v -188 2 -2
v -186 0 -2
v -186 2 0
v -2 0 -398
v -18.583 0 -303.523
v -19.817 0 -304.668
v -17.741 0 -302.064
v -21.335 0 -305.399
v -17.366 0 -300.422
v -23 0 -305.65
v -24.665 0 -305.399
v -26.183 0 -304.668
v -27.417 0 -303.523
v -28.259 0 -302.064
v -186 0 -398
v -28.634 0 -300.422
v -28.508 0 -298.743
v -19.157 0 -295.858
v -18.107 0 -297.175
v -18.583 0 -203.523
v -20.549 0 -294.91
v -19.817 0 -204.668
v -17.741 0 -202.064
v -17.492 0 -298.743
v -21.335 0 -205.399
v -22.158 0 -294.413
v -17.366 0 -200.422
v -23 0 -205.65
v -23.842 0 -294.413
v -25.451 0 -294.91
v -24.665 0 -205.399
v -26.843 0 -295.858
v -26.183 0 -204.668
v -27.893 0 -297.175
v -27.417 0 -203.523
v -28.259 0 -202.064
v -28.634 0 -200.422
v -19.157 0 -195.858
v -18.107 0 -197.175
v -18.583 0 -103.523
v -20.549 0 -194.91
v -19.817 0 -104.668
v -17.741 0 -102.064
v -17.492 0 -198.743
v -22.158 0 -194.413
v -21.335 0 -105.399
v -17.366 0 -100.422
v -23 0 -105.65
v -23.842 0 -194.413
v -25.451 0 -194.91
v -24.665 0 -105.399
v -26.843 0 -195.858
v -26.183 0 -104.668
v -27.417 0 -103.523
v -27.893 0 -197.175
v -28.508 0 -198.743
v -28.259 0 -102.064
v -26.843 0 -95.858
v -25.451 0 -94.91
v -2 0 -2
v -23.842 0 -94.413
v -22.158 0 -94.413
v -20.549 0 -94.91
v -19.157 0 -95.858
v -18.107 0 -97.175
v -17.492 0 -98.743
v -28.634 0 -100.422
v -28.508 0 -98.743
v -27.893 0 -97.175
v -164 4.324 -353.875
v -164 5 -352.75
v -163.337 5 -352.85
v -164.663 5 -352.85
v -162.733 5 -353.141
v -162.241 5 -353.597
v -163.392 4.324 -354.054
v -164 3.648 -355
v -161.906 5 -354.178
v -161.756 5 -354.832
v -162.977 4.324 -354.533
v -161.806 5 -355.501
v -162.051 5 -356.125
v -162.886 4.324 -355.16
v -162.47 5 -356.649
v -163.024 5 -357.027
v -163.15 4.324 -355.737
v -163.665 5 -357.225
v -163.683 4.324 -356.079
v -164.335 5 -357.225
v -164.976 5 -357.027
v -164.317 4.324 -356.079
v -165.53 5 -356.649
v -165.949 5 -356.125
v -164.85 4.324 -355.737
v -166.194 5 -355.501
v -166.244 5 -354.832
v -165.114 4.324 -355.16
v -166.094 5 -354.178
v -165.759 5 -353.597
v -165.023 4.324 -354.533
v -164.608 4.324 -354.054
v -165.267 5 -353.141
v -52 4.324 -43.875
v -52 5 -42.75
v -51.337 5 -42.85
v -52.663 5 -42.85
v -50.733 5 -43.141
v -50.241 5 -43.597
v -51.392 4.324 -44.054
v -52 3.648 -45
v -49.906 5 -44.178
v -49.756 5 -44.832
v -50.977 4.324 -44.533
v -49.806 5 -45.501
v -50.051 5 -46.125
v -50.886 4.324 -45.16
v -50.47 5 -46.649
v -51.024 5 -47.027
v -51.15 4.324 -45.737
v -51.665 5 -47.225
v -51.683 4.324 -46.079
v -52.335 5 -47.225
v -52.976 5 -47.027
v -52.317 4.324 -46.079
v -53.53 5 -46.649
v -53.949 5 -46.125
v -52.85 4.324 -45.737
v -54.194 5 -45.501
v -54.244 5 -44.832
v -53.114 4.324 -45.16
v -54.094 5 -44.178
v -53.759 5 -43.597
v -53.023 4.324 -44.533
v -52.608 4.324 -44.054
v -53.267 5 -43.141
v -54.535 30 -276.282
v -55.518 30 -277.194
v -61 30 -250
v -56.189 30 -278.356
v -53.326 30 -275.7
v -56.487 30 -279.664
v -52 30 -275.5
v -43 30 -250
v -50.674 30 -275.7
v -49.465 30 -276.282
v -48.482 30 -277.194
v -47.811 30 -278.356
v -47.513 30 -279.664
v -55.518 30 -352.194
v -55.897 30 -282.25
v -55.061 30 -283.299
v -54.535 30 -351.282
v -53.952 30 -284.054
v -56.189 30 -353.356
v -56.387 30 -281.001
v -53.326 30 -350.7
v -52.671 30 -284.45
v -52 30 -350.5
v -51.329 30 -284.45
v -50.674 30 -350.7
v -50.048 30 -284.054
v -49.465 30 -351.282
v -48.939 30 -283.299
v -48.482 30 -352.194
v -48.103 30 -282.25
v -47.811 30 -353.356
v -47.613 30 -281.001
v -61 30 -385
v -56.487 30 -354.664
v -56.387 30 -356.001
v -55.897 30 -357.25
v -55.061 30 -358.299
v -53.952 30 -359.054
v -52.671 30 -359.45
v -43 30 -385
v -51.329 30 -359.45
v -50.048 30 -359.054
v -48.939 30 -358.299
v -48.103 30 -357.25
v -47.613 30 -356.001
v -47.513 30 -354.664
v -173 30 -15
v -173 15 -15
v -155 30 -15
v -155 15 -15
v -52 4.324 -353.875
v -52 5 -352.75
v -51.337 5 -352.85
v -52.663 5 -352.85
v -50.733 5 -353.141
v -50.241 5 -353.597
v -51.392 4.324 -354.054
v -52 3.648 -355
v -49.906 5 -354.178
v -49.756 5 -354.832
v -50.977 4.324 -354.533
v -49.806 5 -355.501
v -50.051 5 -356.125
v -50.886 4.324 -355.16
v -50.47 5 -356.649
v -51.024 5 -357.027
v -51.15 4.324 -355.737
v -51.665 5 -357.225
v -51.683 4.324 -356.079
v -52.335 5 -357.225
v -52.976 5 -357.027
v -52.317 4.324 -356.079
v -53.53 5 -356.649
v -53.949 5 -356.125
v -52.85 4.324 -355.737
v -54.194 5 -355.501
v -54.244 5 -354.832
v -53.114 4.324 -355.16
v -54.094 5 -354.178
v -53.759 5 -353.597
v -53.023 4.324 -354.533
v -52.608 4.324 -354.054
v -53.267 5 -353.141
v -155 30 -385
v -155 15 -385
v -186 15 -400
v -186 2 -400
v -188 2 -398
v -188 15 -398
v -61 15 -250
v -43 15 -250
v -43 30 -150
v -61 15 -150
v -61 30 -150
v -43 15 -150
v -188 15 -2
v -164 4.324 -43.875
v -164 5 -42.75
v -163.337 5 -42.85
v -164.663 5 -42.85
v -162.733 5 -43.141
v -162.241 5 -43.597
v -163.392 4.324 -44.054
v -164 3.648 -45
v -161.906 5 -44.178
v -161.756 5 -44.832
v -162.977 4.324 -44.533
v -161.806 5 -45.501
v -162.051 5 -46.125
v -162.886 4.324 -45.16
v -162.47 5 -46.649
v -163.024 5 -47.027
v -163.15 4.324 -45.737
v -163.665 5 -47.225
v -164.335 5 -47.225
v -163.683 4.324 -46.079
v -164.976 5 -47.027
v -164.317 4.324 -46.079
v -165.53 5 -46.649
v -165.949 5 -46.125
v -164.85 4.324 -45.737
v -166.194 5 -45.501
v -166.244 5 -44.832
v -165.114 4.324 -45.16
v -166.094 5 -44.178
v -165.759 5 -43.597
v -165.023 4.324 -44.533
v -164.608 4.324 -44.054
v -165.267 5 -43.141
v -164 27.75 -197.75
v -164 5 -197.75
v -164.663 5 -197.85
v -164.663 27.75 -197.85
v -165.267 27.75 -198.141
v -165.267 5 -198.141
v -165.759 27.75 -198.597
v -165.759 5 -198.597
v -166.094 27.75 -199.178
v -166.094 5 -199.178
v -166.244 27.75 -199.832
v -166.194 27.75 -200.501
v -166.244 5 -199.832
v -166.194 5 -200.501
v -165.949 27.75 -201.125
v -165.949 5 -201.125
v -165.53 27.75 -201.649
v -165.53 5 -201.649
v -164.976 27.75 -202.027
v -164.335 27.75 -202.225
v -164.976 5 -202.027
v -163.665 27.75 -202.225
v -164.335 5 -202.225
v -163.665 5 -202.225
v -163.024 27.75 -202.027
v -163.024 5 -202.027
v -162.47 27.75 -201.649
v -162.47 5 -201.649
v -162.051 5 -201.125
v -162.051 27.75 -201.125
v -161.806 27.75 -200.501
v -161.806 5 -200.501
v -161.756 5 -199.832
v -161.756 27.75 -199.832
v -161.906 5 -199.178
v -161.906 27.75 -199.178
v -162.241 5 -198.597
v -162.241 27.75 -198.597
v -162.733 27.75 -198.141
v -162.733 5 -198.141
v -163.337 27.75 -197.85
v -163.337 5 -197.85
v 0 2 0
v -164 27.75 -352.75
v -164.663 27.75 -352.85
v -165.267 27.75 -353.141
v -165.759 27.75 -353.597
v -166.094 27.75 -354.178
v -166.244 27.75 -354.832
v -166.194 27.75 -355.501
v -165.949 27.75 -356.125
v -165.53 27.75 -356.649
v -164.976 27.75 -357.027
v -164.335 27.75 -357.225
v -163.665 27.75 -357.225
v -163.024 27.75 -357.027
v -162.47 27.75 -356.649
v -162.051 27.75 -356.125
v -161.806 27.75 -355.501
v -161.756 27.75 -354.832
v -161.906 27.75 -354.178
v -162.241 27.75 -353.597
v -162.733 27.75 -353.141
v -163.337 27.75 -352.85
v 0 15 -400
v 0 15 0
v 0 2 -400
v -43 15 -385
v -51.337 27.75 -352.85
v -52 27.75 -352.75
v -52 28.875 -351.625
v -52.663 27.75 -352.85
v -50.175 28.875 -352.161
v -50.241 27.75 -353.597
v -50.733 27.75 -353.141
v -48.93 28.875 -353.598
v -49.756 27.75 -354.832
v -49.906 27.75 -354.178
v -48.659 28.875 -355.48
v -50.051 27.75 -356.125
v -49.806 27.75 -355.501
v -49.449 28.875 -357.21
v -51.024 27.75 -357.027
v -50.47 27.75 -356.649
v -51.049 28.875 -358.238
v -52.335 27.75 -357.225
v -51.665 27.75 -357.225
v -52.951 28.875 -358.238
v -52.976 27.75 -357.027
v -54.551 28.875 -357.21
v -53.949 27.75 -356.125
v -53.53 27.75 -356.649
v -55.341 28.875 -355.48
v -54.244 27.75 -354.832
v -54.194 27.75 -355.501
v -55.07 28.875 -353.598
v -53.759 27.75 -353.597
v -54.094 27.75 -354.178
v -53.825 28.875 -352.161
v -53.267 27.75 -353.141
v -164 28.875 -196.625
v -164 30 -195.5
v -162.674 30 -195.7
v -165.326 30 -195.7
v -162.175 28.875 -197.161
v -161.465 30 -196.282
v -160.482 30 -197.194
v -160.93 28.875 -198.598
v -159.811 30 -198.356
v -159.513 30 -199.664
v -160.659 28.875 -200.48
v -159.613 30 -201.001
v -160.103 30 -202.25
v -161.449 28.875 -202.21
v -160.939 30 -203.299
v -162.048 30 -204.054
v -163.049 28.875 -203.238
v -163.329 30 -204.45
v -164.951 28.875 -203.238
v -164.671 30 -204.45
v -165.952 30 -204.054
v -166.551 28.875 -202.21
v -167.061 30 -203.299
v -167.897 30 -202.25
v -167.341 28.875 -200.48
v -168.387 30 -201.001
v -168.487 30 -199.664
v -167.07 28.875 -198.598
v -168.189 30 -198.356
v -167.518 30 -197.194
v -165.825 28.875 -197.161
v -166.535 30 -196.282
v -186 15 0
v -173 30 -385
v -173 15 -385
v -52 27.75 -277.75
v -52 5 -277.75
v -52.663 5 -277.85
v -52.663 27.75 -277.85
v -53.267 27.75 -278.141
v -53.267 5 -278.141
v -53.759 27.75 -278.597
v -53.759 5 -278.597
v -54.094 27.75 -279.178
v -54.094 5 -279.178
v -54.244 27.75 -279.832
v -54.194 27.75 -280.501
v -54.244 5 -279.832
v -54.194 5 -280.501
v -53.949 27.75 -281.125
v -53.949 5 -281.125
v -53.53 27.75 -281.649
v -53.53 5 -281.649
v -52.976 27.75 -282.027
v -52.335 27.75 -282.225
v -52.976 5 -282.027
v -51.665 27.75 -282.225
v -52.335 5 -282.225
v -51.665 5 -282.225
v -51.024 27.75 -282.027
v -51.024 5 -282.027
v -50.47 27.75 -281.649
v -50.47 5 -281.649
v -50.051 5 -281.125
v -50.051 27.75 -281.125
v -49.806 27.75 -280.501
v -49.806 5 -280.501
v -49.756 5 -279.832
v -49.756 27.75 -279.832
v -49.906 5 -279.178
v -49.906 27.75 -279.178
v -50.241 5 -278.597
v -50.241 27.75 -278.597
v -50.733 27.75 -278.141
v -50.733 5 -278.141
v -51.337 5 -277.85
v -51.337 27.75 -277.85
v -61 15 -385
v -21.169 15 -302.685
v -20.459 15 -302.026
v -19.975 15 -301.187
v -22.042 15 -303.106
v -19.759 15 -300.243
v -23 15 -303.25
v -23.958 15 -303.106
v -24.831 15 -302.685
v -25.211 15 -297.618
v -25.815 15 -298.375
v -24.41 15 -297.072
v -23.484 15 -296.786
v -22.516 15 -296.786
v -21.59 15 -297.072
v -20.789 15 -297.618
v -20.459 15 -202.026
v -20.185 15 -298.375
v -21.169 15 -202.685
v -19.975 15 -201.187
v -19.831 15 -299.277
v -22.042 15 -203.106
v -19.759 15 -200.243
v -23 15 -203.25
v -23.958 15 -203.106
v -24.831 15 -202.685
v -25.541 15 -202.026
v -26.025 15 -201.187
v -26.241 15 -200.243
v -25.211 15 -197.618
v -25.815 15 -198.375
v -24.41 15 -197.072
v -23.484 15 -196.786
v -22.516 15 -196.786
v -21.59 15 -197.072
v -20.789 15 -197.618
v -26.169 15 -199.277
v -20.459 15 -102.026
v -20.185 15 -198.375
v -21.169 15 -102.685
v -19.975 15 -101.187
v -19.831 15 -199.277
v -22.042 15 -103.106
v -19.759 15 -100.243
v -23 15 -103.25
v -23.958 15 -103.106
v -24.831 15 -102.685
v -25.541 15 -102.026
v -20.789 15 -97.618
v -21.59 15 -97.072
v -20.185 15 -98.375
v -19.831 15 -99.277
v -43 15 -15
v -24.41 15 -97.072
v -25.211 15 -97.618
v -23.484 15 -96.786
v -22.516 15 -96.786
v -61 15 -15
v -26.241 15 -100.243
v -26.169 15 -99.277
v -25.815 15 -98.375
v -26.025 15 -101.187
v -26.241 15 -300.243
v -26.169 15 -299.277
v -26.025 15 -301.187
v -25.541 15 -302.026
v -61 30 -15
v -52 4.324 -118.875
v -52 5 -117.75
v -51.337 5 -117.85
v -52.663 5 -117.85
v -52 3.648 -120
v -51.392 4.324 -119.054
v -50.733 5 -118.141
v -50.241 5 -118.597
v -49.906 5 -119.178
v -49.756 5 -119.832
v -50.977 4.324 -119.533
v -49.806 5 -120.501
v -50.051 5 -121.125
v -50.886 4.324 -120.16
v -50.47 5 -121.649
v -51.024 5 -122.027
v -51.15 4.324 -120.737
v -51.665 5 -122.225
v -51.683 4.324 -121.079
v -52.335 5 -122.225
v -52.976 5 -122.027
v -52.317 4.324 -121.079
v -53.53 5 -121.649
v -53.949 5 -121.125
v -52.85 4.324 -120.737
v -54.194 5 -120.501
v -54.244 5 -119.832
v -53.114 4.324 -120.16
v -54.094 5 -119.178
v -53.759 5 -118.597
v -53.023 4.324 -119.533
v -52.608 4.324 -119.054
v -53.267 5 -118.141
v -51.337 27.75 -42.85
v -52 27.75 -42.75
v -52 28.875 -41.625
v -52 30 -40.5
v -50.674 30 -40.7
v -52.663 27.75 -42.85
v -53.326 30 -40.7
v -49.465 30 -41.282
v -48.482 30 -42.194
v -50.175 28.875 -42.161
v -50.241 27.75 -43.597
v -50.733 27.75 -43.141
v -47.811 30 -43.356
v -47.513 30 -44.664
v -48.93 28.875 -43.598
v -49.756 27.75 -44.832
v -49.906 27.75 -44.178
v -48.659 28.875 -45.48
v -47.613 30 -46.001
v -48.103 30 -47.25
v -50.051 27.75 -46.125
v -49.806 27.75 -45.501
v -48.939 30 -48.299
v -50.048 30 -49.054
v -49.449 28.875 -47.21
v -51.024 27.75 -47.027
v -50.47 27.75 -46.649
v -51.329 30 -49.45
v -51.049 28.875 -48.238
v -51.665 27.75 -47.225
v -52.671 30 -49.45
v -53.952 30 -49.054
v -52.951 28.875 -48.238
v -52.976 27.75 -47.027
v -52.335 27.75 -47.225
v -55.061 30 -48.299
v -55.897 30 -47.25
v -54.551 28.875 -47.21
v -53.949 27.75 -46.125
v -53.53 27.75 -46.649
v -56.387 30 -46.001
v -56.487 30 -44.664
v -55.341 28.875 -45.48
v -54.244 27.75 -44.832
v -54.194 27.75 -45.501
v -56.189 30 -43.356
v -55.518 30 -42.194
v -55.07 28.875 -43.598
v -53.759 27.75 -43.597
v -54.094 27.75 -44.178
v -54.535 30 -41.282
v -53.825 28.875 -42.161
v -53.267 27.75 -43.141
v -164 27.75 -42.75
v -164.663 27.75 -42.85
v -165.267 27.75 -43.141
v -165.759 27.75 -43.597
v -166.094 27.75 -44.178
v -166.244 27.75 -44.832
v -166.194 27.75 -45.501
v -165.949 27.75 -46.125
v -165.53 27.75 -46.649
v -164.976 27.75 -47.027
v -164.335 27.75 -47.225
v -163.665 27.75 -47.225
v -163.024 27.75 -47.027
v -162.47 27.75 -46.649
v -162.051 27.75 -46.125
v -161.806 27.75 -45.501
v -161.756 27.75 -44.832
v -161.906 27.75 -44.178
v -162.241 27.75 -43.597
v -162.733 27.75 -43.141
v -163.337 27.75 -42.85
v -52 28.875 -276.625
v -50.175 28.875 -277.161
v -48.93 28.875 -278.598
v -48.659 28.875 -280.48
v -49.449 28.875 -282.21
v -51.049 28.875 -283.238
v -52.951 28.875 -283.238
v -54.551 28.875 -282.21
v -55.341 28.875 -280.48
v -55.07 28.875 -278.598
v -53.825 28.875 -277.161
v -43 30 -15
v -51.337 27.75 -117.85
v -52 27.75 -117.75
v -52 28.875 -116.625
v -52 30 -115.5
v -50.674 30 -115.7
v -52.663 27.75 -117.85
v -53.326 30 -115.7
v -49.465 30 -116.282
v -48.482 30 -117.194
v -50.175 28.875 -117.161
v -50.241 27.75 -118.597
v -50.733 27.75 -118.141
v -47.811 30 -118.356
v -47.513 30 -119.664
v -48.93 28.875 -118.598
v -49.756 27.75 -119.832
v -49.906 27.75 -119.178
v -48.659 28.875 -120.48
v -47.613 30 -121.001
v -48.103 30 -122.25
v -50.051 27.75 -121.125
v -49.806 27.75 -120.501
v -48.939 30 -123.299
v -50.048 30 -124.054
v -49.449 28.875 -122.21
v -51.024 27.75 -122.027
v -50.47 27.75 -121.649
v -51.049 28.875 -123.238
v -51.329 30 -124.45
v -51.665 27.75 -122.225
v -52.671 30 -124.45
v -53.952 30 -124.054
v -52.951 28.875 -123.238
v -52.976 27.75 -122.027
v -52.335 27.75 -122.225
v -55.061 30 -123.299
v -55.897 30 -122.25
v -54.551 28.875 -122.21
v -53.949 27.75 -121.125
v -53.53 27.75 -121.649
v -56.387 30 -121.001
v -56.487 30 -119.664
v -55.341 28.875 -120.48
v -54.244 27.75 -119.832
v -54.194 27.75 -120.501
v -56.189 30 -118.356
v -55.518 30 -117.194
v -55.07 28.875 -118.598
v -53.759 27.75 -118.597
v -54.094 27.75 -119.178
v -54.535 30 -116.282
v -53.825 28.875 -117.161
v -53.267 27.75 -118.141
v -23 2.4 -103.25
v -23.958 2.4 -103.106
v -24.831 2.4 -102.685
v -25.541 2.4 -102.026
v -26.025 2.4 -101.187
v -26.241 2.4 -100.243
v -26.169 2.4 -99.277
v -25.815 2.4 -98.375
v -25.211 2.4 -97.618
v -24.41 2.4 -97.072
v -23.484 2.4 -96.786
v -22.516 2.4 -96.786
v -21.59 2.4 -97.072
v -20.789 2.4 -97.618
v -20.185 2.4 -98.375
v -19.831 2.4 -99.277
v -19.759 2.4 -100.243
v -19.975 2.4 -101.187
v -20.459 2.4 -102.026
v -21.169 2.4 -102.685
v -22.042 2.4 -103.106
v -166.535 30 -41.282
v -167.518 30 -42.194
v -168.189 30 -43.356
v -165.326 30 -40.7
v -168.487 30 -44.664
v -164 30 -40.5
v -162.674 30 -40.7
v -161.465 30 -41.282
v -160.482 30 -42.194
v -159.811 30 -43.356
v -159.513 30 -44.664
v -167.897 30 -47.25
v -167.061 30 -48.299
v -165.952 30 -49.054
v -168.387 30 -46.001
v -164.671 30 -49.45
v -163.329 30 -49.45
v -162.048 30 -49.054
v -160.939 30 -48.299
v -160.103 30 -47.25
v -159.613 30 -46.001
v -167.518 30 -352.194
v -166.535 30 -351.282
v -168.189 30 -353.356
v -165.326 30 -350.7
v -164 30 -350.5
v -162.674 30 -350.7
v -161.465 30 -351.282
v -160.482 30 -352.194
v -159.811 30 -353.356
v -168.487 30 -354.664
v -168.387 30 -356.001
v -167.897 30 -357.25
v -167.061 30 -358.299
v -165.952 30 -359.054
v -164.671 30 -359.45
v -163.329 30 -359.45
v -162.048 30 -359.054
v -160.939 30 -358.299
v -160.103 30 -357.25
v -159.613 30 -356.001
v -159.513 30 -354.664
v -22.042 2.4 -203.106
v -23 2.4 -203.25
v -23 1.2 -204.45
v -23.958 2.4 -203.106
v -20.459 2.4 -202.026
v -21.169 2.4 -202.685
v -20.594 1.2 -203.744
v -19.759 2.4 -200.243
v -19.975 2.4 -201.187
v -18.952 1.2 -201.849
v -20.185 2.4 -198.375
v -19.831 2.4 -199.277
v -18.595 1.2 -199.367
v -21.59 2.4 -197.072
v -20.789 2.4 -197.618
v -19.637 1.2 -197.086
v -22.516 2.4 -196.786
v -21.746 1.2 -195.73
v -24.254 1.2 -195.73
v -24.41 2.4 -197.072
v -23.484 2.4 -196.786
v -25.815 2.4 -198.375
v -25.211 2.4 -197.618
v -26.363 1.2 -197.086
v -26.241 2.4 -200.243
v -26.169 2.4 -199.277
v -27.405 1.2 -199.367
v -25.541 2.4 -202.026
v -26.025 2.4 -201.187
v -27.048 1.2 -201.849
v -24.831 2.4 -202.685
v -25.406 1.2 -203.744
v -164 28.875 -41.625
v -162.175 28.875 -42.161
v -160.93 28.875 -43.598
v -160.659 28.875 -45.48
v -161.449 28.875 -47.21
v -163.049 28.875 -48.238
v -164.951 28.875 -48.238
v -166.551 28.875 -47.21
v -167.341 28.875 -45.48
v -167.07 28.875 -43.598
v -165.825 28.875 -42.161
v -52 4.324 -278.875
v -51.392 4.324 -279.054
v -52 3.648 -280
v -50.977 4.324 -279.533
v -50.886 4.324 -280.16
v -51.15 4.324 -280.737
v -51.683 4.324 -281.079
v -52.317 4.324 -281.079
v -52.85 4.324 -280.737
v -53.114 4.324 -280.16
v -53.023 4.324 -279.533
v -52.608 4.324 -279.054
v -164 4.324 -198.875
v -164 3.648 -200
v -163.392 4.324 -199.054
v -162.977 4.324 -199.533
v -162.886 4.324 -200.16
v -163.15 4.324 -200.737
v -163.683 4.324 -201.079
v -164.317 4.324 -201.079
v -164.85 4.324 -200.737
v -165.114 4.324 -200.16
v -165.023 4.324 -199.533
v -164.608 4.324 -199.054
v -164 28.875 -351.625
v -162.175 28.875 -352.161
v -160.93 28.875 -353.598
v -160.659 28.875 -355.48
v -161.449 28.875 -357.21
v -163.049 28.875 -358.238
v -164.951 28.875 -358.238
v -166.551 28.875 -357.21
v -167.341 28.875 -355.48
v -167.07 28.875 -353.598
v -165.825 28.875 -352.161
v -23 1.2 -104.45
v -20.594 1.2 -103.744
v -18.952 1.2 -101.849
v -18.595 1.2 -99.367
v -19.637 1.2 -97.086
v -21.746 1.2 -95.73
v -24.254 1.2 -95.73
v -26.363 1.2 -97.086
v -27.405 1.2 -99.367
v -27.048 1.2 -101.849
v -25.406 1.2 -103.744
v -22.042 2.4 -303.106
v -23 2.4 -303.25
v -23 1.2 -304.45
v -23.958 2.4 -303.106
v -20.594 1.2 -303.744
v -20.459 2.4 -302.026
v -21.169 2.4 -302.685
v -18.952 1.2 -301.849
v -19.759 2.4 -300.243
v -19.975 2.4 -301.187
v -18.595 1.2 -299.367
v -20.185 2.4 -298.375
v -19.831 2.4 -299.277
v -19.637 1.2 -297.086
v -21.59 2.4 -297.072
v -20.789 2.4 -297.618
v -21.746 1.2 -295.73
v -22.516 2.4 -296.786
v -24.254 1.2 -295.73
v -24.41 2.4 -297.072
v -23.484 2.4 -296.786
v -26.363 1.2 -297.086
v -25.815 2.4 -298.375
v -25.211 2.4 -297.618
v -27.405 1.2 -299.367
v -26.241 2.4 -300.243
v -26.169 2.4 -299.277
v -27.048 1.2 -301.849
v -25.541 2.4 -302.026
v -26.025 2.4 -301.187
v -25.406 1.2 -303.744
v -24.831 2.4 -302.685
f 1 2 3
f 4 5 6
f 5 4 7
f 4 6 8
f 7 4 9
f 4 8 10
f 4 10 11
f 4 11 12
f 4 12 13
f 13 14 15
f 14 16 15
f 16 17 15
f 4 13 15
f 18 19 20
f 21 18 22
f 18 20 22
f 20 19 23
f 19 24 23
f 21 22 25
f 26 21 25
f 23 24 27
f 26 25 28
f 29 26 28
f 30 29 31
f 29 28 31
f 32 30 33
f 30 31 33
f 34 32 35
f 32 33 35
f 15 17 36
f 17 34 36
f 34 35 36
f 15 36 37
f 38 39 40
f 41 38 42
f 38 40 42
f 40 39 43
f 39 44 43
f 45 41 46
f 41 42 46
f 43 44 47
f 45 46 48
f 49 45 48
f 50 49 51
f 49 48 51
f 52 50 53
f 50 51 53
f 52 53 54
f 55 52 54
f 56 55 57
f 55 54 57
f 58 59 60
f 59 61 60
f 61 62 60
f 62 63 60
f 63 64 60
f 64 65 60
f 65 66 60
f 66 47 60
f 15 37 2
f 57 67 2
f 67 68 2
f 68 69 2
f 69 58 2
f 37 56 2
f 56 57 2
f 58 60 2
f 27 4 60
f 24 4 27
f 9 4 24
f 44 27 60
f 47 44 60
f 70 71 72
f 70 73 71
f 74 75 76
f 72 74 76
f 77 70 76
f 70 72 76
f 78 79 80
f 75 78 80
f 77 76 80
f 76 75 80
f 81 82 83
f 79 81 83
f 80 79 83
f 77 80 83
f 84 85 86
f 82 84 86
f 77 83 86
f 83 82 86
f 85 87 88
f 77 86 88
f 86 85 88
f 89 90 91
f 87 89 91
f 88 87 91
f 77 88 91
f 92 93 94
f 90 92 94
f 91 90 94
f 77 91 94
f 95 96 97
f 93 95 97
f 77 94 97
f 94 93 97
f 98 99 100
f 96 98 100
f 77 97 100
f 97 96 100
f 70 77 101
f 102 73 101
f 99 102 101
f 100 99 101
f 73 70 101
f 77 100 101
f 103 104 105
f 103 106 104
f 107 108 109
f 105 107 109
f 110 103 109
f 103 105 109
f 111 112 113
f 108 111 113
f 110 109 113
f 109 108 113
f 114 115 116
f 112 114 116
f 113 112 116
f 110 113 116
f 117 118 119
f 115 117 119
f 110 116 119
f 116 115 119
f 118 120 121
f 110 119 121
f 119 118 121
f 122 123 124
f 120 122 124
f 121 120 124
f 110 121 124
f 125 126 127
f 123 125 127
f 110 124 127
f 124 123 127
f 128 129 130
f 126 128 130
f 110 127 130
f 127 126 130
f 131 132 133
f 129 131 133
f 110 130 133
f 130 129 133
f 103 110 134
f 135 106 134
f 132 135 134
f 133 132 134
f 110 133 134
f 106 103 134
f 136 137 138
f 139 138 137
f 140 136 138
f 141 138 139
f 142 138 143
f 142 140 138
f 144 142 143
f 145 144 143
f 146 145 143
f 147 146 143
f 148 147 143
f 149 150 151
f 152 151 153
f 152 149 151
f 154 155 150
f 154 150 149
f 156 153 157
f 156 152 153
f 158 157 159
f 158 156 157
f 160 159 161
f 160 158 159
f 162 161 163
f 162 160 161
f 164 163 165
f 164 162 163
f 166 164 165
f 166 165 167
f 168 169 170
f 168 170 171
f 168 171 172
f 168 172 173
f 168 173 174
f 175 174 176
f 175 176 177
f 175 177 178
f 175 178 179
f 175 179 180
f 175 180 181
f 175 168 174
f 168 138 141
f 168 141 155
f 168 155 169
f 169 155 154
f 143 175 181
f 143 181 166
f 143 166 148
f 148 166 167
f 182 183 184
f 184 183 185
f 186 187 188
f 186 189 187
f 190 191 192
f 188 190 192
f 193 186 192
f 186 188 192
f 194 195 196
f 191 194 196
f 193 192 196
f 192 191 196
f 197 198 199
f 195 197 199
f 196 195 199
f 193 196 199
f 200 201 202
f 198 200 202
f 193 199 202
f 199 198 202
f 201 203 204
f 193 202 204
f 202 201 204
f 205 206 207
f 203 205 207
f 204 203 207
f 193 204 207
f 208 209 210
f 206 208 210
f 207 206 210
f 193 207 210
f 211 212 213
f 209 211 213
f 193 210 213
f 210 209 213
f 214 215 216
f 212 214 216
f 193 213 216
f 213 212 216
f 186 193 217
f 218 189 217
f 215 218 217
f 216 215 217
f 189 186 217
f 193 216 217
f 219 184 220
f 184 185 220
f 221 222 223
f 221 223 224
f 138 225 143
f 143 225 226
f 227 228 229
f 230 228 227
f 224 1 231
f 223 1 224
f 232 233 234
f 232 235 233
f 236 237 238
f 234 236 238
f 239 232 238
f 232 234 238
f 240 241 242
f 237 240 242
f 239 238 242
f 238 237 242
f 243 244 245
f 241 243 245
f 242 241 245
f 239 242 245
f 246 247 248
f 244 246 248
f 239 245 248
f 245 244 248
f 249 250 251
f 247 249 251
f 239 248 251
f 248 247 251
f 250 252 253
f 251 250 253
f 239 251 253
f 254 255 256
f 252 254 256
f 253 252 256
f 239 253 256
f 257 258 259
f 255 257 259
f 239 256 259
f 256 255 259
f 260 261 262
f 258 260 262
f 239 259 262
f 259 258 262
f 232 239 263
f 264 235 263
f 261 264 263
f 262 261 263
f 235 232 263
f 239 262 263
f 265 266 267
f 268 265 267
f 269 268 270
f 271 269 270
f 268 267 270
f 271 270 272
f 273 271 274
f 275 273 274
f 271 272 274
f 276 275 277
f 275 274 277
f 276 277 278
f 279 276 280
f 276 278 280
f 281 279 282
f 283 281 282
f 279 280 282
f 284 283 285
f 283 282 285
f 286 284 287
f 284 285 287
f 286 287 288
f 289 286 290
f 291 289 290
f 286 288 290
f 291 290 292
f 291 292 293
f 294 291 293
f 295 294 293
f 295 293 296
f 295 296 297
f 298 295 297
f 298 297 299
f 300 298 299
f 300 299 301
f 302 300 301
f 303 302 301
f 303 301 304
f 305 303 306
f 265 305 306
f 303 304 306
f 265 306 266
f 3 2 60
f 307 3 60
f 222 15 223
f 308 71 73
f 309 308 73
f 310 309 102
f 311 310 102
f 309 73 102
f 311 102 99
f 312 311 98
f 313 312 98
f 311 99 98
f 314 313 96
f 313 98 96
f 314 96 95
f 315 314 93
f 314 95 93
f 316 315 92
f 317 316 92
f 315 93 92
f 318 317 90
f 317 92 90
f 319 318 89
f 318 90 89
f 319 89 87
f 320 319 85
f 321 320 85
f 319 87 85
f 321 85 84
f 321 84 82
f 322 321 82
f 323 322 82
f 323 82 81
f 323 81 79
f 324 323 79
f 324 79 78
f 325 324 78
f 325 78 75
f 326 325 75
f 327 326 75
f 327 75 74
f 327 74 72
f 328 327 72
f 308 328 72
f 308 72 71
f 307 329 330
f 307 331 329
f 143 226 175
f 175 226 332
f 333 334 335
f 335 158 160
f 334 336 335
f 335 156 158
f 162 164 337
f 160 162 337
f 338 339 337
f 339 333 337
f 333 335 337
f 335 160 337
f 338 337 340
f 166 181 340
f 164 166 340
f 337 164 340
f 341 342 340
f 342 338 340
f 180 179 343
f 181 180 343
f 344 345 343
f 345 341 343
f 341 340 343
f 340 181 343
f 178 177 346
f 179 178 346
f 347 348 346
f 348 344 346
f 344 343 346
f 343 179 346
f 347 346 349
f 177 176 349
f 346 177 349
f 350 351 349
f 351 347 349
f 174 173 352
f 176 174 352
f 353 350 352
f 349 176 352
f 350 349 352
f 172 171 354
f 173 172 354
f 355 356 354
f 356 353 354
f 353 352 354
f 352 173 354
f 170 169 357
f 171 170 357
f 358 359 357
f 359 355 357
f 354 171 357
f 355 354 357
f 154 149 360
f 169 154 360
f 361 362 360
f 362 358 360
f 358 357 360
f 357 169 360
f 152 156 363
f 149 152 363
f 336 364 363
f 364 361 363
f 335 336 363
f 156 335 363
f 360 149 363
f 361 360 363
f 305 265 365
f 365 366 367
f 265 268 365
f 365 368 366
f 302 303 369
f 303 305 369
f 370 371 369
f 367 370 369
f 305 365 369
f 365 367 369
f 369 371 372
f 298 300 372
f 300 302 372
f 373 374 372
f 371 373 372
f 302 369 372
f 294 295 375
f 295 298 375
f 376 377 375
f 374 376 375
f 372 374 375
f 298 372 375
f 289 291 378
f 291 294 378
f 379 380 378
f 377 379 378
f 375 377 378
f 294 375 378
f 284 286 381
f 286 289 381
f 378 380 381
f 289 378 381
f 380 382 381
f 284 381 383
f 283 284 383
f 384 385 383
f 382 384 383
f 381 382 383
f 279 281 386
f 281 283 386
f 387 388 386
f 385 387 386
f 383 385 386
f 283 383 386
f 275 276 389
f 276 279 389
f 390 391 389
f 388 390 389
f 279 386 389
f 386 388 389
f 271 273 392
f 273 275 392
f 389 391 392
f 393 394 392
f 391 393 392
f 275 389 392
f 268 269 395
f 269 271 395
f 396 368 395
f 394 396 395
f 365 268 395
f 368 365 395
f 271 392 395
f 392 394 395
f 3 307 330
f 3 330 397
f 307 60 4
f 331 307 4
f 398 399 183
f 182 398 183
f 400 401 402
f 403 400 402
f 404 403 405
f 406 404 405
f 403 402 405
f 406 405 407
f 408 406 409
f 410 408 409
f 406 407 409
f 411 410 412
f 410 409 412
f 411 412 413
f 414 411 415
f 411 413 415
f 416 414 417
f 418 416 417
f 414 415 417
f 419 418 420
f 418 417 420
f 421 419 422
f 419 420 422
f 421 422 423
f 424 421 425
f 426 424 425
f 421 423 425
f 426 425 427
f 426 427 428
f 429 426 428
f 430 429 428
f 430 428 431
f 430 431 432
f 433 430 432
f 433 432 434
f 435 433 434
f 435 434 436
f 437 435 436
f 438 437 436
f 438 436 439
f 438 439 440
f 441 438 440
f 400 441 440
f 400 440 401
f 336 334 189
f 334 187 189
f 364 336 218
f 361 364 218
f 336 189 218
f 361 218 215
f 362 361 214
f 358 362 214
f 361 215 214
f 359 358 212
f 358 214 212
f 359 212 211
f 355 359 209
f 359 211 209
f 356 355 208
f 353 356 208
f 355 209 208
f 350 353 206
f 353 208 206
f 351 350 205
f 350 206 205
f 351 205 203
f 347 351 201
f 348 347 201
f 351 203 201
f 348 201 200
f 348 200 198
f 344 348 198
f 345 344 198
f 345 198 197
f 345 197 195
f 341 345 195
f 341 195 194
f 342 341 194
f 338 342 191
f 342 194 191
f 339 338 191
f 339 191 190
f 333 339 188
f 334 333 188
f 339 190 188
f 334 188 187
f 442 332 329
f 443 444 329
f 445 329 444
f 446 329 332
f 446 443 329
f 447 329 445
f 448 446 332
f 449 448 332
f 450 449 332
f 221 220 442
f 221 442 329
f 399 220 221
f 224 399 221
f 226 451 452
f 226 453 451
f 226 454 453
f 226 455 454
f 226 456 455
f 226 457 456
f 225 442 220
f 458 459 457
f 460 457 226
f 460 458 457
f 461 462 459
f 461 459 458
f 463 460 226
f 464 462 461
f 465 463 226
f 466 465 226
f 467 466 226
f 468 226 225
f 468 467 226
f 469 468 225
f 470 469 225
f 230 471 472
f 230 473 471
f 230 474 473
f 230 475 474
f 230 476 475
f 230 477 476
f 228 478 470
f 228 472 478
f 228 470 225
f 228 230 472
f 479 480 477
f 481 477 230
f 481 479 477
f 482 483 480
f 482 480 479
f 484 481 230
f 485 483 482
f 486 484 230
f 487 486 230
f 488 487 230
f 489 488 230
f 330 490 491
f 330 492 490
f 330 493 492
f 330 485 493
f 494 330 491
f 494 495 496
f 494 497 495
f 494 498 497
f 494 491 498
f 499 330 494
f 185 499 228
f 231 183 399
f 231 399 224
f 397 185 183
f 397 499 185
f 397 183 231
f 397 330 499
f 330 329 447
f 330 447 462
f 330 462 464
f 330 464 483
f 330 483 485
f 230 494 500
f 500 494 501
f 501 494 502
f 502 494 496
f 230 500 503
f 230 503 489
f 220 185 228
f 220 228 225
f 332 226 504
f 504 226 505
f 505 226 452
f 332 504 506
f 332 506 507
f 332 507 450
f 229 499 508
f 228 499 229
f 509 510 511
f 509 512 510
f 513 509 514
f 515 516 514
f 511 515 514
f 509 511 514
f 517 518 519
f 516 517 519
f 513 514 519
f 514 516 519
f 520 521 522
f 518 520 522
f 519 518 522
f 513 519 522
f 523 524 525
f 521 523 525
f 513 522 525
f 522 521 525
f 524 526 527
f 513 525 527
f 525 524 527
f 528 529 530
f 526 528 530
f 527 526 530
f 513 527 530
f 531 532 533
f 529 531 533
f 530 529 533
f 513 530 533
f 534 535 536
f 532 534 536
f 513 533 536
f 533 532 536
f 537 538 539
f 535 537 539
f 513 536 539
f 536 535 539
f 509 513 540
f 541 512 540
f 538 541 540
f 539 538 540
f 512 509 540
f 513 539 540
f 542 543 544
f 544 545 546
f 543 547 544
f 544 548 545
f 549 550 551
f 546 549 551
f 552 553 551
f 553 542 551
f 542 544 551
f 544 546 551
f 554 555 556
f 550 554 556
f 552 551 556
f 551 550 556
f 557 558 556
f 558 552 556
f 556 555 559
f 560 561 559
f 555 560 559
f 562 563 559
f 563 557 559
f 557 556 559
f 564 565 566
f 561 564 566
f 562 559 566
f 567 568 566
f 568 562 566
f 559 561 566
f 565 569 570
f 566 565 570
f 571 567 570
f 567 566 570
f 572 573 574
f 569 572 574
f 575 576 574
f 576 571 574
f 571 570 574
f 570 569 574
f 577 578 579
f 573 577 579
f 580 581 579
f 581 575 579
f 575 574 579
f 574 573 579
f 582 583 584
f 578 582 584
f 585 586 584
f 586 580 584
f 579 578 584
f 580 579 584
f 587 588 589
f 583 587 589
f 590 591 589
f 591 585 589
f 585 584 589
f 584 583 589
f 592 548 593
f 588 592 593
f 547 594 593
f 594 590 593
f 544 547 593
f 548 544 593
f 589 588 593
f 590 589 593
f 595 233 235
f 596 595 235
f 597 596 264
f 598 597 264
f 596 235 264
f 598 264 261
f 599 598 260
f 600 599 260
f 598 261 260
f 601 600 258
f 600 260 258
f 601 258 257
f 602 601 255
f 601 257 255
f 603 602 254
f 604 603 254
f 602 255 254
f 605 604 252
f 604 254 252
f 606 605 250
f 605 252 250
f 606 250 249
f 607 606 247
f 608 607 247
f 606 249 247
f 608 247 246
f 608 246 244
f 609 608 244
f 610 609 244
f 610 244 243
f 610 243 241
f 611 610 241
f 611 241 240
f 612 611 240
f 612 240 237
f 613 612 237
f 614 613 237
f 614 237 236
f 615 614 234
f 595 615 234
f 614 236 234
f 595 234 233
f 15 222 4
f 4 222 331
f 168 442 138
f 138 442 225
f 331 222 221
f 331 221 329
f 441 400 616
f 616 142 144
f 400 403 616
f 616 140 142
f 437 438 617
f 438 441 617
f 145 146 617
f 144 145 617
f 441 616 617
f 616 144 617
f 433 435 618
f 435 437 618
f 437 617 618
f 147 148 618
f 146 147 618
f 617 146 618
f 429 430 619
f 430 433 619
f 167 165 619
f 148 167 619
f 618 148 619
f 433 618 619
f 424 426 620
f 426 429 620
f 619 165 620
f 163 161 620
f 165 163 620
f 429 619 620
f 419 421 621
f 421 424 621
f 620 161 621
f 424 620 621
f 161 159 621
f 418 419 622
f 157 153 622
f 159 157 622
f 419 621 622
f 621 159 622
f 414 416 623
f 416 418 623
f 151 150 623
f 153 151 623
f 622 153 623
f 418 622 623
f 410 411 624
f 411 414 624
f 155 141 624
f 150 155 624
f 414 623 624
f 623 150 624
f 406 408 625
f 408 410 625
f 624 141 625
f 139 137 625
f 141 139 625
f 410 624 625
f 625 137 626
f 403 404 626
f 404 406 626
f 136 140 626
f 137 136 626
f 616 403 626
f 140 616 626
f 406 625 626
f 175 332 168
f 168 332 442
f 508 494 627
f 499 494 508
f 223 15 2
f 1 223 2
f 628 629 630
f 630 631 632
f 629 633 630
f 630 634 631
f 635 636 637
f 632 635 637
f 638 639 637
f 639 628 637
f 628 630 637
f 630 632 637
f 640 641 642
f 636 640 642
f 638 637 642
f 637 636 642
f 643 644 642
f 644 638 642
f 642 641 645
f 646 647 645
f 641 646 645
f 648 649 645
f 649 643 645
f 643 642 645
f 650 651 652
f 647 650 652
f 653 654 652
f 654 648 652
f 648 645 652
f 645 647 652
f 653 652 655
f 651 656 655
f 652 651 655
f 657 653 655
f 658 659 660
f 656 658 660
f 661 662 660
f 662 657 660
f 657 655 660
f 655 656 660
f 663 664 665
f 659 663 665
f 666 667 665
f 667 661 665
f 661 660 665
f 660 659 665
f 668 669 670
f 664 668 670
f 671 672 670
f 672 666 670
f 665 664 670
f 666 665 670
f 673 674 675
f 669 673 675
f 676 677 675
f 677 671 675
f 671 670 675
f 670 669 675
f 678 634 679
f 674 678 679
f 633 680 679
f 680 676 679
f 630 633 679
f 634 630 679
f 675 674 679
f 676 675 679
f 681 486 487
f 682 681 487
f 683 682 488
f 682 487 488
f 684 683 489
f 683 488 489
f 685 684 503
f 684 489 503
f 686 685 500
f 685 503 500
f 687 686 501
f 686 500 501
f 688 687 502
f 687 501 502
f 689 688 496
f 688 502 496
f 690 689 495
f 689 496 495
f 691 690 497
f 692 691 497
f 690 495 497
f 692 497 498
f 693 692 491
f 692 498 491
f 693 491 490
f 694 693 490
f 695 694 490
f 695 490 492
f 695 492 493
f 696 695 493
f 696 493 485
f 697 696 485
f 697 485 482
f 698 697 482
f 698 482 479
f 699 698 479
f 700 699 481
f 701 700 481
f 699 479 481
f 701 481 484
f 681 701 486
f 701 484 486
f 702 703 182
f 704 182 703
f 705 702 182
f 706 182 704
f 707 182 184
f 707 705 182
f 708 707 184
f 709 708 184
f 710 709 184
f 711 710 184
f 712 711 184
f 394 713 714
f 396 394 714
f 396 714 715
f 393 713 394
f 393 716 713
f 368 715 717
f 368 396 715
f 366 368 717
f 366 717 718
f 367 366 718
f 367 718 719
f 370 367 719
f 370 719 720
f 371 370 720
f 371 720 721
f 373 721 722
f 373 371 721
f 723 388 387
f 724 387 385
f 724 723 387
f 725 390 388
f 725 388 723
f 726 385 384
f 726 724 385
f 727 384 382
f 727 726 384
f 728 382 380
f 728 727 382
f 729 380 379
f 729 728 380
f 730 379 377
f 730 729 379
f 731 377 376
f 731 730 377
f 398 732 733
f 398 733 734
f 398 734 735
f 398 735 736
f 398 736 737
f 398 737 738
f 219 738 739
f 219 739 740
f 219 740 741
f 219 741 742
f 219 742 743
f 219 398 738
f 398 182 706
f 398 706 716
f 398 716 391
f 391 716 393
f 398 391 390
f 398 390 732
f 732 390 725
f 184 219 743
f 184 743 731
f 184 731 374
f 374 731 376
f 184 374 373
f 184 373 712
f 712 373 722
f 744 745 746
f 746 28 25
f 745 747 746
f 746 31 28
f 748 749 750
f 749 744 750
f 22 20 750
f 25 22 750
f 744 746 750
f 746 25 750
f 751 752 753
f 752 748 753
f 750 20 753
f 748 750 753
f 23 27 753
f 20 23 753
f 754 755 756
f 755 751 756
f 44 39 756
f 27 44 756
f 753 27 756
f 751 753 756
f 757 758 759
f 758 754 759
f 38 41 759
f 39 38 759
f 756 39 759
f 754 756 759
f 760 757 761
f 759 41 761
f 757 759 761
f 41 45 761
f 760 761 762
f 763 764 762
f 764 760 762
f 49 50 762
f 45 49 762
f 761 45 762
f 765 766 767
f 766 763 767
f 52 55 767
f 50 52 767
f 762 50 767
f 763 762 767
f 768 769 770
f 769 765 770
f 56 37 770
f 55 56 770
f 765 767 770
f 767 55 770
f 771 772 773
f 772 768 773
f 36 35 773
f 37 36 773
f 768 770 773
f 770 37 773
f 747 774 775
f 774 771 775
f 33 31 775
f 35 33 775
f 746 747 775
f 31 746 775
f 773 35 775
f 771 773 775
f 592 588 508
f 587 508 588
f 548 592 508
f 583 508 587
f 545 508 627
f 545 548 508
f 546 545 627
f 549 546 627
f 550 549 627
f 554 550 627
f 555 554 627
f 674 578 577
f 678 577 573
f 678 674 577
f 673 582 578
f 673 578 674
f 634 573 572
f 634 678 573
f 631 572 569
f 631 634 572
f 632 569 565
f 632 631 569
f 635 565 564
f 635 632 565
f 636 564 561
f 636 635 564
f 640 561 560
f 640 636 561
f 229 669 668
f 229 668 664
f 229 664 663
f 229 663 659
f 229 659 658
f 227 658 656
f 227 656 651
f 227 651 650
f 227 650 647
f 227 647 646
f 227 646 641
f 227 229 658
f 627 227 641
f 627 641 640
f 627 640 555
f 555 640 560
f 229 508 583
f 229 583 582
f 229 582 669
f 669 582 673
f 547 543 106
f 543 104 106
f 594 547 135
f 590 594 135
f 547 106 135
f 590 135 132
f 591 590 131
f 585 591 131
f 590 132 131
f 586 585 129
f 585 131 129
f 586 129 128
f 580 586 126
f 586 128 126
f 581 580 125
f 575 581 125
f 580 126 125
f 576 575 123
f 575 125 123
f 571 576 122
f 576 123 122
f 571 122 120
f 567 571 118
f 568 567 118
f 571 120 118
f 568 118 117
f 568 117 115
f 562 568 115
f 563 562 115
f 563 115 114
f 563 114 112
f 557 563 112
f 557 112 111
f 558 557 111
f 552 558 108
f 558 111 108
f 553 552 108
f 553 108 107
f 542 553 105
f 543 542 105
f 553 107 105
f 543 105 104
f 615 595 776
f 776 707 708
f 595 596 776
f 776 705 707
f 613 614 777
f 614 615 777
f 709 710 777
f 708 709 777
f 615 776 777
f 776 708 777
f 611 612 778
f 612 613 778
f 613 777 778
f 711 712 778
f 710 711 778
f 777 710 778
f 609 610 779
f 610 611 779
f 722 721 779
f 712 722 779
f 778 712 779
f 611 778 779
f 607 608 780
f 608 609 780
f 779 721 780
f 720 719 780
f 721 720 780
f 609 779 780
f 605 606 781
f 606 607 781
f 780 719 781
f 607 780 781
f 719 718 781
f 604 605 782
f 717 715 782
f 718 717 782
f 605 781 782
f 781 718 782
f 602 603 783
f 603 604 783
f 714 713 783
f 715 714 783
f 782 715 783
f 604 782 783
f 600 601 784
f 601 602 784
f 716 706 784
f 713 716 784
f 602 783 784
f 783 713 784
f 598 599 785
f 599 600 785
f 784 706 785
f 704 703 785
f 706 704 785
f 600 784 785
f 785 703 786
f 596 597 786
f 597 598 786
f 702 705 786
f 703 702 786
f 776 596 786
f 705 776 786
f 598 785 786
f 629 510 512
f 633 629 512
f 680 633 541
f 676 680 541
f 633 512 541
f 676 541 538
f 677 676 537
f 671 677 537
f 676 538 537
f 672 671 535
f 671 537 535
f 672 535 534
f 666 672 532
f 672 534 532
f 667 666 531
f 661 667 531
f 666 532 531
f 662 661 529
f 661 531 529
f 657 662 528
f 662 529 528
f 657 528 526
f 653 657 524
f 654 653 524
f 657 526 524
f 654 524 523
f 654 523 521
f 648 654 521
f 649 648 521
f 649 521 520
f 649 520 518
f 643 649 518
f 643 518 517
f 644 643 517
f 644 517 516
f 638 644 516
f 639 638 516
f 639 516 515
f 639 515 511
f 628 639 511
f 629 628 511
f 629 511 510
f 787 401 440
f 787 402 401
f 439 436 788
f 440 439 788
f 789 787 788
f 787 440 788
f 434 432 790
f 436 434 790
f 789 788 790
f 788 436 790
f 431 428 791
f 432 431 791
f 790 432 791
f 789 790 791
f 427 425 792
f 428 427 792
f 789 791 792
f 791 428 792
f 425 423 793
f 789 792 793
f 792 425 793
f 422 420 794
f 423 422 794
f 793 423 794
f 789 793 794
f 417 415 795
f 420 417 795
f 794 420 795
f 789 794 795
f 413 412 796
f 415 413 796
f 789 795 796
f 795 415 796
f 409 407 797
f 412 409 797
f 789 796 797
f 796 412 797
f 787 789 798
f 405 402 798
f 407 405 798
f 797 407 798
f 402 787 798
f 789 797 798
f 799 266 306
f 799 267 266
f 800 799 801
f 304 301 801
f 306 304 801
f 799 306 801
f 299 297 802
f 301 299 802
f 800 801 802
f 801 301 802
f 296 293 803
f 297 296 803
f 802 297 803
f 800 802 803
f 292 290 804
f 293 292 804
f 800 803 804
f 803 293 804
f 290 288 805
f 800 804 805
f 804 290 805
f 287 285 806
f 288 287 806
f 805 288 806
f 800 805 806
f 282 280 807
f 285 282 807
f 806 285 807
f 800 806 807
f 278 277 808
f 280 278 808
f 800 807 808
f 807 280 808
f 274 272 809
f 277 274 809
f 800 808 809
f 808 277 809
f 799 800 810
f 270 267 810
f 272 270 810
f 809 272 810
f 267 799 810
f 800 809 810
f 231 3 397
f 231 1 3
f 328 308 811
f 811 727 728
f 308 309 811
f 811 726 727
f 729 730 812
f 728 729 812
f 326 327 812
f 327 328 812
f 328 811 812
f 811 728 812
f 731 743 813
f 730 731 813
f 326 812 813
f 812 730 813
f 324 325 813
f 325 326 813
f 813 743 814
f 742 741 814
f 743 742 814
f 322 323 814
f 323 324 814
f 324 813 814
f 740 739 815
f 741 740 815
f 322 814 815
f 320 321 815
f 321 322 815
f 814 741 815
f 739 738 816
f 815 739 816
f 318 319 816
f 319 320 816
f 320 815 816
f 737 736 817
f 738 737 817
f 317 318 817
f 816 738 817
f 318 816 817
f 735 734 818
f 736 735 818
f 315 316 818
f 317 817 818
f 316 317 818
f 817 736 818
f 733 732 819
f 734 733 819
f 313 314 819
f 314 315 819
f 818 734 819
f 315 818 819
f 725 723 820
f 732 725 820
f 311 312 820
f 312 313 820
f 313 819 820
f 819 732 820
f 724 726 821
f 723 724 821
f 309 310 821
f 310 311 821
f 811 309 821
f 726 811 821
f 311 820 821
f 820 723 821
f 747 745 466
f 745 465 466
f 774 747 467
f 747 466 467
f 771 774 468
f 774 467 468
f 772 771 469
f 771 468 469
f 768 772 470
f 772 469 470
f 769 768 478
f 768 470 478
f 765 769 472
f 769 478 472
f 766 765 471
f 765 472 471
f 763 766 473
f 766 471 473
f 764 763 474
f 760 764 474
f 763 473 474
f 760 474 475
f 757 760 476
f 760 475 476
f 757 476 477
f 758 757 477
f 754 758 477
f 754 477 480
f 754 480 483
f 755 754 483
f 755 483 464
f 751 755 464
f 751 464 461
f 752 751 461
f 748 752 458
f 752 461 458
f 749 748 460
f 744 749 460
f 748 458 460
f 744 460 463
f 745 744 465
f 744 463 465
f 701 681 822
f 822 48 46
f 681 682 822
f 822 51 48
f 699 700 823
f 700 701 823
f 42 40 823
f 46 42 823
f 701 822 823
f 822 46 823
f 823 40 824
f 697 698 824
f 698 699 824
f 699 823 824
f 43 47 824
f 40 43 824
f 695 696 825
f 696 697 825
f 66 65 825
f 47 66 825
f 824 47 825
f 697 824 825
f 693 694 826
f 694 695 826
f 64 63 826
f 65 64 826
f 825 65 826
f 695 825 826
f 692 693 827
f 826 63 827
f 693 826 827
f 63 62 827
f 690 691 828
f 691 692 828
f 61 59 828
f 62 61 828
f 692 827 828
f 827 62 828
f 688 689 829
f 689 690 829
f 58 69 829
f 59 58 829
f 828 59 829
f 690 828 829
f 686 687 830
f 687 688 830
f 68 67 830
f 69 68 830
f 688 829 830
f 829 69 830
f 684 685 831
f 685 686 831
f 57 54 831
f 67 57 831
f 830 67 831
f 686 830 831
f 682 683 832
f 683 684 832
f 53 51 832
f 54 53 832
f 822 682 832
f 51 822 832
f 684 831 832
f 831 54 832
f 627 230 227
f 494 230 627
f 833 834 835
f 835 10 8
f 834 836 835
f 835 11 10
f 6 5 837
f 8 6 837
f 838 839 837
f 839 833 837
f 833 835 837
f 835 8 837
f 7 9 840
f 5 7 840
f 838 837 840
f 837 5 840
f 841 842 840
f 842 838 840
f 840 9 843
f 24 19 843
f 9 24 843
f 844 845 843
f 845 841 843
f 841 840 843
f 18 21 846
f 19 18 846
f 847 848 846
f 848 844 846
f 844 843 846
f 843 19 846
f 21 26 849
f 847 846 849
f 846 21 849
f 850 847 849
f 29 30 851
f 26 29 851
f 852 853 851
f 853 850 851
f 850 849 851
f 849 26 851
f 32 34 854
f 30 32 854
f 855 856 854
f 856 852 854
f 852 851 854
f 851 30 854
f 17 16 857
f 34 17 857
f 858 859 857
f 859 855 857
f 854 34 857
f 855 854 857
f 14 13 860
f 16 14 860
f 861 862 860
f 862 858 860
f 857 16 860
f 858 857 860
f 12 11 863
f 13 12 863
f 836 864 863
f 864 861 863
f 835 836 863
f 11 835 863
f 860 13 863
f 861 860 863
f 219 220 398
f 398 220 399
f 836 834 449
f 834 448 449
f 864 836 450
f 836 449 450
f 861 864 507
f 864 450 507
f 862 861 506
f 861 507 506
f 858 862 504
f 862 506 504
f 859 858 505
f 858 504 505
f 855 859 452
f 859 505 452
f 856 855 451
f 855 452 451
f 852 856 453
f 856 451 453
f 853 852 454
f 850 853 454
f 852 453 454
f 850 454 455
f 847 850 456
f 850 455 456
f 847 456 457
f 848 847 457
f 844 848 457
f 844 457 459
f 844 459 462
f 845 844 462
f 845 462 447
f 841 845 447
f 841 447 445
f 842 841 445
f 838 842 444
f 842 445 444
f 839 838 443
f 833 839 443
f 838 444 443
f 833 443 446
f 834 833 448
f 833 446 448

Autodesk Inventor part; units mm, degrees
ref_plane "YZ Plane" through (0, 0, 0) normal (1, 0, 0) x (0, 1, 0)
ref_plane "XZ Plane" through (0, 0, 0) normal (0, 1, 0) x (-1, 0, 0)
ref_plane "XY Plane" through (0, 0, 0) normal (0, 0, 1) x (1, 0, 0)
sketch "Skizze1" plane through (0, 0, 0) normal (0, 1, 0) x (-1, 0, 0)
  line L0 (0, 0) -> (188, 0)
  line L1 (188, 0) -> (188, -400)
  line L2 (188, -400) -> (0, -400)
  line L3 (0, -400) -> (0, 0)
  dimension "d1" = 188
  dimension "d2" = 400
extrude "Extrusion1" add sketch "Skizze1" along normal blind 15
sketch "Skizze2" plane through (0, 15, 0) normal (0, 1, 0) x (1, 0, 0)
  line L0 (-173, 15) -> (-155, 15)
  line L1 (-155, 15) -> (-155, 385)
  line L2 (-155, 385) -> (-173, 385)
  line L3 (-173, 385) -> (-173, 15)
  line L4 (-43, 15) -> (-61, 15)
  line L5 (-61, 15) -> (-61, 150)
  line L6 (-61, 150) -> (-43, 150)
  line L7 (-43, 150) -> (-43, 15)
  line L8 (-43, 385) -> (-61, 385)
  line L9 (-61, 385) -> (-61, 250)
  line L10 (-61, 250) -> (-43, 250)
  line L11 (-43, 250) -> (-43, 385)
  line L12 (-188, 0) -> (0, 0) projected
  line L13 (0, 0) -> (0, 400) projected
  dimension "d5" = 18
  dimension "d6" = 370
  dimension "d7" = 18
  dimension "d8" = 135
  dimension "d9" = 135
  dimension "d10" = 18
  dimension "d11" = 15
  dimension "d12" = 150
  dimension "d13" = 250
  dimension "d14" = 43
  dimension "d15" = 155
  dimension "d16" = 43
extrude "Extrusion2" add sketch "Skizze2" along normal blind 15
sketch "Skizze3" plane through (0, 30, 0) normal (0, 1, 0) x (1, 0, 0)
  point P0 (0, 0)
  point P1 (-52, 45)
  point P2 (-52, 120)
  point P3 (-52, 280)
  point P4 (-52, 355)
  point P5 (-164, 355)
  point P6 (-164, 200)
  point P7 (-164, 45)
hole "Bohrung1" at (-52, 30, -45) at (-52, 30, -120) at (-52, 30, -280) at (-52, 30, -355) at (-164, 30, -355) at (-164, 30, -200) at (-164, 30, -45) direction (0, -1, 0) diameter 4.5 depth 25 tip angle 118 countersink diameter 9 countersink angle 90
sketch "Skizze4" plane through (0, 0, 0) normal (0, -1, 0) x (1, 0, 0)
  line L0 (0, 0) -> (-188, 0) projected
  line L1 (0, -400) -> (0, 0) projected
  point P0 (-23, -200)
  point P1 (-23, -100)
  point P2 (-23, -300)
  dimension "d26" = 100
  dimension "d27" = 200
  dimension "d28" = 300
  dimension "d29" = 23
  dimension "d30" = 23
  dimension "d31" = 23
hole "Bohrung2" at (-23, 0, -100) at (-23, 0, -200) at (-23, 0, -300) direction (0, 1, 0) diameter 6.5 end through all countersink diameter 11.3 countersink angle 90
chamfer "Fase1" distance 2 angle 45 6 edges at (-188, 0, -200) (-94, 0, 0) (-188, 7.5, 0) (0, 0, -200) (-94, 0, -400) (-188, 7.5, -400)
properties part number "frontHolz" material "Pappel"
